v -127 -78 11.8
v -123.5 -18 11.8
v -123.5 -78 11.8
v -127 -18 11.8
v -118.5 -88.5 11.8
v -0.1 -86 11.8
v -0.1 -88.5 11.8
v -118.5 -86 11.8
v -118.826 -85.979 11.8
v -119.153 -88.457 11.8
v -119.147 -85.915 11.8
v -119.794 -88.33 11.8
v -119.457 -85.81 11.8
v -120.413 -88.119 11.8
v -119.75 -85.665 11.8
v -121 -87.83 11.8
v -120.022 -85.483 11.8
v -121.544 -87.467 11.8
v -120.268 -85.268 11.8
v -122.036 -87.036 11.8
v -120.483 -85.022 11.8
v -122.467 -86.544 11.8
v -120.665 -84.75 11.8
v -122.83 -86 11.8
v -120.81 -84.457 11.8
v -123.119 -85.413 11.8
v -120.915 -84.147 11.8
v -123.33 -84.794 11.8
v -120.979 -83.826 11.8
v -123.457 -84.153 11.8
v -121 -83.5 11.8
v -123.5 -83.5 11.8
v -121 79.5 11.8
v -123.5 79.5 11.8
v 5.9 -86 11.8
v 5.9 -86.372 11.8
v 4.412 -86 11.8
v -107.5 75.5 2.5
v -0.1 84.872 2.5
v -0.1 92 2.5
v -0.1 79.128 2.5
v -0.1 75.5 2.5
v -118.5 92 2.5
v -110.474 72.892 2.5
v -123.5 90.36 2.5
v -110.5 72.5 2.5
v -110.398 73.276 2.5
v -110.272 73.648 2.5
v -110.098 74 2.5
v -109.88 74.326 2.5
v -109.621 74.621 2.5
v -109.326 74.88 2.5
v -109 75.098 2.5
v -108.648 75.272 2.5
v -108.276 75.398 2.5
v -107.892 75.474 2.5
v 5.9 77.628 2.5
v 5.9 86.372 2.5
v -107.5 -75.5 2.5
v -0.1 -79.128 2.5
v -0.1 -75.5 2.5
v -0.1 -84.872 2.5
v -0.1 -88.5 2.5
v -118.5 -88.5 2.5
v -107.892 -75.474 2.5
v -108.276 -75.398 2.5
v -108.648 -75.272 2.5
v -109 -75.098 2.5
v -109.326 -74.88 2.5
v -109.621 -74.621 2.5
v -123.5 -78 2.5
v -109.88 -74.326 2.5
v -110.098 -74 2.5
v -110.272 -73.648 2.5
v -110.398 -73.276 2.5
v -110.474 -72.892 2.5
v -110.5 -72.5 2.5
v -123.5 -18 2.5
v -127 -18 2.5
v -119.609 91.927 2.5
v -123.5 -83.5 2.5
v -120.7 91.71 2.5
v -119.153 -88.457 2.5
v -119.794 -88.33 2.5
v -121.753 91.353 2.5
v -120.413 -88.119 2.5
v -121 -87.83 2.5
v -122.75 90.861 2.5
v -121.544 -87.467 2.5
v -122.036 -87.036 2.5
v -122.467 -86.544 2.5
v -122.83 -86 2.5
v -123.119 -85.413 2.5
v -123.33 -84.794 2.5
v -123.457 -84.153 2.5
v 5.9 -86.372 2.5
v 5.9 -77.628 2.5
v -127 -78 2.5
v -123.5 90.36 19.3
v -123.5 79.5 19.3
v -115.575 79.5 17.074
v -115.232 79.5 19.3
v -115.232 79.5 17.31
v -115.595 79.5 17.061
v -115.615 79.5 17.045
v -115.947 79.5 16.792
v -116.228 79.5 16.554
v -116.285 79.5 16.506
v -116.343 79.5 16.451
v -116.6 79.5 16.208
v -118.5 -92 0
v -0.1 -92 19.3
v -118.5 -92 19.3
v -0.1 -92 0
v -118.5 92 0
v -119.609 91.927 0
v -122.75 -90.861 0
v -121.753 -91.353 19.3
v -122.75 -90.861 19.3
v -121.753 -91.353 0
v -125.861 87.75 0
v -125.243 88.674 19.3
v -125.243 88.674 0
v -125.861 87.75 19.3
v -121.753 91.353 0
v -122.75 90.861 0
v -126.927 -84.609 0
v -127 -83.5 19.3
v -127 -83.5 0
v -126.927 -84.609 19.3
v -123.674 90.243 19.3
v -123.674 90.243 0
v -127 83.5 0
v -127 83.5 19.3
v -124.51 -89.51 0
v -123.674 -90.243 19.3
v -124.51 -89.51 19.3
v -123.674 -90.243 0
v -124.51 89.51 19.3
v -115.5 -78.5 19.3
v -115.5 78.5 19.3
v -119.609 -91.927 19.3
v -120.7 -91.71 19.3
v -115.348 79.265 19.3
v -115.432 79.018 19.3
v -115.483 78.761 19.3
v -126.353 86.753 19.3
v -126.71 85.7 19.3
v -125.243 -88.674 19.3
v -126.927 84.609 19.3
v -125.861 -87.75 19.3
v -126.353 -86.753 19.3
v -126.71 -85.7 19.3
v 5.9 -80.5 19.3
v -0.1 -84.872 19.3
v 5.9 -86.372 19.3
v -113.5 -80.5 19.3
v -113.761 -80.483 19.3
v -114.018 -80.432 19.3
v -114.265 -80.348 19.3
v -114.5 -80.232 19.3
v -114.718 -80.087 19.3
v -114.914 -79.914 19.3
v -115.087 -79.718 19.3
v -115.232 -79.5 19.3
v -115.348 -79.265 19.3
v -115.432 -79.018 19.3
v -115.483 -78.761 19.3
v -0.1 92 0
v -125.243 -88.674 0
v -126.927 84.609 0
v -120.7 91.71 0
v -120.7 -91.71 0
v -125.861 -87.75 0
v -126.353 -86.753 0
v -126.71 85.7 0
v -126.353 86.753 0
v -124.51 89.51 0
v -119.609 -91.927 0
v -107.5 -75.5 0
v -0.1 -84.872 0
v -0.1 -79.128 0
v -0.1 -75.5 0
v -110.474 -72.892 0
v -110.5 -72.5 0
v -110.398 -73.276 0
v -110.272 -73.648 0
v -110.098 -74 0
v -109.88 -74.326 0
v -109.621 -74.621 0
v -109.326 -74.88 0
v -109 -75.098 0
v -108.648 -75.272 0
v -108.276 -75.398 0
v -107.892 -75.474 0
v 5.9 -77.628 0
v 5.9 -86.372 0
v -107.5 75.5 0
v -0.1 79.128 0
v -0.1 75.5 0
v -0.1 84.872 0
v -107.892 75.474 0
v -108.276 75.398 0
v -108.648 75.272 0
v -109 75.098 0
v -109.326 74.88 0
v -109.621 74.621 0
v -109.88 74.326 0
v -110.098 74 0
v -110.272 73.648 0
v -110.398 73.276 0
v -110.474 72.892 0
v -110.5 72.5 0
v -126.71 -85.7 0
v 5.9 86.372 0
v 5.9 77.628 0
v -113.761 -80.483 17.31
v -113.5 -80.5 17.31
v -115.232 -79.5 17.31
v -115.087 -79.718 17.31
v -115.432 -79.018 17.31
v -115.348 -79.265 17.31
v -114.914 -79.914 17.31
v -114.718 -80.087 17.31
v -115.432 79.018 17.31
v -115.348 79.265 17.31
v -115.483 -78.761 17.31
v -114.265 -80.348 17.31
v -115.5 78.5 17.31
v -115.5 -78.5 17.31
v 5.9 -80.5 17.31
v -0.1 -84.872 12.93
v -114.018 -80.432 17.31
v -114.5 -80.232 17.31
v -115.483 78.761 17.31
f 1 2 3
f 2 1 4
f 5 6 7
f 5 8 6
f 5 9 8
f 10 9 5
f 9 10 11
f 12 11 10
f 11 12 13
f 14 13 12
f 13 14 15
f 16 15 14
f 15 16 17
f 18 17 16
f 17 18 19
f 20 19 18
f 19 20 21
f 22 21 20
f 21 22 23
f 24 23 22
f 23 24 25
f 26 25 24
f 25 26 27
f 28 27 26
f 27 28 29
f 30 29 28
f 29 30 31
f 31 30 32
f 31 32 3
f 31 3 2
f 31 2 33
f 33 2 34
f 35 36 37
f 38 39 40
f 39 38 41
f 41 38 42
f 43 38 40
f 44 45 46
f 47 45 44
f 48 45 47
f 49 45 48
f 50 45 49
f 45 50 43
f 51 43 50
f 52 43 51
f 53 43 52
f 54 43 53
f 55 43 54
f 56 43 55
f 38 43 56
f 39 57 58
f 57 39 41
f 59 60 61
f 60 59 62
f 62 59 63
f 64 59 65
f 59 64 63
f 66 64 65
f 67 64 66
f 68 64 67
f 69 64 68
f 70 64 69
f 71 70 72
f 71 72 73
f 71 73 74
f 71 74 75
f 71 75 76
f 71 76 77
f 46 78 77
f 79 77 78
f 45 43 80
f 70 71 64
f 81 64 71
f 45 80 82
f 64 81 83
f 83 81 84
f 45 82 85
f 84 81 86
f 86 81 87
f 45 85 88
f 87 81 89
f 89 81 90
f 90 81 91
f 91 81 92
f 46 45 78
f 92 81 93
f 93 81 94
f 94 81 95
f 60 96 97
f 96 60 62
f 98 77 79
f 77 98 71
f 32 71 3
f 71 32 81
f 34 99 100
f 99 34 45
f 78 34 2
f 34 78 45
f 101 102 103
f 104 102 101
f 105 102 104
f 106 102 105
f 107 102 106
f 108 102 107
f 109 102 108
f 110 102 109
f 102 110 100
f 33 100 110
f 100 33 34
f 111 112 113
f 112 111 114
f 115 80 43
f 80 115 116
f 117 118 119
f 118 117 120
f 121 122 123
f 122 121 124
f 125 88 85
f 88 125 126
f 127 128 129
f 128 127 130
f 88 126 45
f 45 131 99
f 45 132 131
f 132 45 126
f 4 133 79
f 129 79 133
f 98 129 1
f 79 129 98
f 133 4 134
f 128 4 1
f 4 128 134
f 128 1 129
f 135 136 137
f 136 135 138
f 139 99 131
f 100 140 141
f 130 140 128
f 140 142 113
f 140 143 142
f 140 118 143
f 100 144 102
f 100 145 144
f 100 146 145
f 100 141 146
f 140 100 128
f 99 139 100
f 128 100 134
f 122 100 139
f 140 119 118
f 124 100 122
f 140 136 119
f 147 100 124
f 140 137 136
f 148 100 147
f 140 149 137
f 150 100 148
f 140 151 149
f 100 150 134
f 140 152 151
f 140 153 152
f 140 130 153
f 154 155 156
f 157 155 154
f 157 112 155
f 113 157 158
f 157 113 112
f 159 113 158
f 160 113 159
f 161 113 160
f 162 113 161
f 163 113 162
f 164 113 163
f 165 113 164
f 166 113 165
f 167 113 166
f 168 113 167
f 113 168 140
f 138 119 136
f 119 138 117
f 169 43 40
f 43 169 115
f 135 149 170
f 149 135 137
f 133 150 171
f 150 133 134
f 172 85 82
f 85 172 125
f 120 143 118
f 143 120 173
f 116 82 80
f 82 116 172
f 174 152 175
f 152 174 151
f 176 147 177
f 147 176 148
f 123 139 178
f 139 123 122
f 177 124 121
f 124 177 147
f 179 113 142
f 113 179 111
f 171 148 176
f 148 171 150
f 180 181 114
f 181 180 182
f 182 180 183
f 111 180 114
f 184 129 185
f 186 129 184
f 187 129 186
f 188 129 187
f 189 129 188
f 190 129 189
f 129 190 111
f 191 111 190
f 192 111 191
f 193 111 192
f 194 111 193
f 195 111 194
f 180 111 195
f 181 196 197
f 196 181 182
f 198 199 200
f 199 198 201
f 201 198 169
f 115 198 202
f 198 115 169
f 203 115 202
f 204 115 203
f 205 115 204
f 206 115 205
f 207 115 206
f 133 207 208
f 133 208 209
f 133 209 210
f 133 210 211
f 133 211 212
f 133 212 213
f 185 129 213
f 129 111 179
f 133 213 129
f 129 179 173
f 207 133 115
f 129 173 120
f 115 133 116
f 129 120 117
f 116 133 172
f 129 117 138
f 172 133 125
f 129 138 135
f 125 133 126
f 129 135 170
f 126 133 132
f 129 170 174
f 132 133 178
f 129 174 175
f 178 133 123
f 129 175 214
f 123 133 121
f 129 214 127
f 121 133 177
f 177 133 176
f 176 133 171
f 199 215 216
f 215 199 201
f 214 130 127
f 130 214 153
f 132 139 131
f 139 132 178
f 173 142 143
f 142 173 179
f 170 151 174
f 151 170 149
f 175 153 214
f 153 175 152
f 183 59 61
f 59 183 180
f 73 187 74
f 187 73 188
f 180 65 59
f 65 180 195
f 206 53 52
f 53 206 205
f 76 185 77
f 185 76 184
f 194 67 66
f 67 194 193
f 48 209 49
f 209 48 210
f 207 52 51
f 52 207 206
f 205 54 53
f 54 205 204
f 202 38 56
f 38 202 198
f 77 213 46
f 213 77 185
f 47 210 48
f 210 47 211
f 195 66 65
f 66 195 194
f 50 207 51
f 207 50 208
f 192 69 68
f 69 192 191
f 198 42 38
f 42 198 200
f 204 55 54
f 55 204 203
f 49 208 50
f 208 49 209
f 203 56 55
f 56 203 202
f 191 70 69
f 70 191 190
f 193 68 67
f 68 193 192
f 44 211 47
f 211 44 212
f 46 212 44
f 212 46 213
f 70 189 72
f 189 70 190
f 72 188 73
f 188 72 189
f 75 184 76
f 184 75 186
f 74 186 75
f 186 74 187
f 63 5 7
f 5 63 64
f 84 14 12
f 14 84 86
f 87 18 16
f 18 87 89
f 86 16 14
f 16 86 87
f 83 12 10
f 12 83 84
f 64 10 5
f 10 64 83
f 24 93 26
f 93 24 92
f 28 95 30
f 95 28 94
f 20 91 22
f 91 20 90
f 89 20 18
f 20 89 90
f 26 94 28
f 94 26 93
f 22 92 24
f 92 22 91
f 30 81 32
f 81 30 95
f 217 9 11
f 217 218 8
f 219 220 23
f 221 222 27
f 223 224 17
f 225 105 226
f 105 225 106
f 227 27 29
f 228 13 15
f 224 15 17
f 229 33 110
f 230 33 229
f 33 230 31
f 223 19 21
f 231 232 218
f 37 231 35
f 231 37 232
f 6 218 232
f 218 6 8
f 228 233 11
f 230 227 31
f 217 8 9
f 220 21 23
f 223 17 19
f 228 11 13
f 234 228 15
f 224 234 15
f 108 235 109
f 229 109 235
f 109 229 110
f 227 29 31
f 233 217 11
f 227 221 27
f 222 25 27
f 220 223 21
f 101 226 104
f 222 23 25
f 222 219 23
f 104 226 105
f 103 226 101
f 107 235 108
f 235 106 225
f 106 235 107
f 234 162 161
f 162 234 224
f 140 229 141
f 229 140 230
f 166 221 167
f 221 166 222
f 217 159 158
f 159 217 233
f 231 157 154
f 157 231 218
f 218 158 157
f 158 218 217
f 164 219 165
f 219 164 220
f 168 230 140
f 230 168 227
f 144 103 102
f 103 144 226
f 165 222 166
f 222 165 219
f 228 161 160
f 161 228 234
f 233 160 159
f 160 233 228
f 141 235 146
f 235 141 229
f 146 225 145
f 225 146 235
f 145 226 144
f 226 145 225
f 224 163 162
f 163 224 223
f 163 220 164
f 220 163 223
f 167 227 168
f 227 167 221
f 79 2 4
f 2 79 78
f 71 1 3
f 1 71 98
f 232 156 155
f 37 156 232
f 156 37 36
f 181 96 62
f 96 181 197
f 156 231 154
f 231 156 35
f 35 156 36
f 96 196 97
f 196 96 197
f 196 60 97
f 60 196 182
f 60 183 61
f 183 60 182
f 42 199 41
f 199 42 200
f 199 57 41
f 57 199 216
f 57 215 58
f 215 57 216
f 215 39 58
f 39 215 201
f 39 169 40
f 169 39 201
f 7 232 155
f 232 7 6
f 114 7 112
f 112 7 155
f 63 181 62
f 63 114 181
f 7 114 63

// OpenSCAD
// file: surface-go-window-frame.scad
// Slide-in window frame for the Surface Go (1st gen) shop screen.
//
// The flat front face goes against the inside of the window glass, taped all
// the way round (12 mm VHB, e.g. 3M 5952). The tablet slides in from the open
// top edge, between the front lip and the back lip, and rests on the bottom wall.
// The Surface Connect slot is on the tablet's right edge as seen from outside
// (looking at the screen), near the bottom. Seen from the room that is the left wall.
//
// This file renders the landscape frame (open on a long edge).
// surface-go-window-frame-portrait.scad renders the portrait one (open on a
// short edge, charger at the bottom). It reuses the modules here, so change
// dimensions in this file only. The -left/-right and -portrait-top/-bottom
// files render the two halves of each frame for a 256 mm bed.
//
// Anti-rattle: the pocket has 1 mm of front-back play. Stick a strip of 1 mm
// self-adhesive felt along the back of the tablet's two side edges and bottom
// edge (within 6 mm of the edge, where the back rim overlaps it).
//
// Print front face down on the bed (clean, flat face for the tape). No supports:
// the back rim overhangs 2.5 mm flat, then slopes at 45 degrees, and there is
// no rim over the opening. Only the charger slot is bridged (60 mm).
// Strength: 4 walls (perimeters), 30% gyroid infill.
// Units mm. Coordinates as seen from the ROOM (the tablet's back) in landscape: x right,
// y up, z from the glass (0) towards the room.
//
// Licence: CC BY-NC 4.0

/* [Tablet - Surface Go 1 is 245 x 175 x 8.3] */
tab_w = 245.0;
tab_h = 175.0;
tab_t = 8.3;
clear = 1.0;           // per side around the tablet edge
play_t = 1.0;          // front-back play; a 1 mm felt strip takes it up
tab_r = 5.0;           // pocket corner radius (keep <= tablet's corner radius)

/* [Frame] */
wall = 3.5;            // side wall thickness (3.5 keeps the frame inside a 256 mm bed)
lip = 2.5;             // front lip thickness (glass side)
lip_over = 13.0;       // front lip covers the bezel this far (screen starts ~17 in)
back_flat = 2.5;       // back rim: flat overhang (prints without support)
back_over = 8.0;       // back rim: total reach over the tablet's back
back_skin = 2.0;       // back rim thickness above the 45 degree slope

/* [Cutouts - tablet edges as in landscape] */
// (room view: the charger edge is the LEFT wall, the buttons are top RIGHT)
cable_y = [-78, -18];  // Surface Connect slot in the left wall (room view), y range
btn_x = [68, 112];     // power + volume on the top edge (room view), x range

/* [Split for printing - two halves, dovetails + glue] */
dt_neck = 6.0;         // dovetail width at the seam
dt_head = 9.0;         // dovetail width at its tip
dt_len = 6.0;          // how far the dovetail reaches into the other half
dt_fit = 0.2;          // total gap between the halves (all round the dovetail)

$fn = 48;

// --- derived ---------------------------------------------------------------
pw = tab_w + 2 * clear;          // pocket 247 x 177
ph = tab_h + 2 * clear;
ow = pw + 2 * wall;              // outer 254 x 184
oh = ph + 2 * wall;
o_r = tab_r + wall;

z_pocket0 = lip;
z_back = lip + tab_t + play_t;   // tablet back / start of back lip
z_slope = z_back + (back_over - back_flat);
z_top = z_slope + back_skin;

win_w = pw - 2 * lip_over;       // 221 x 151 window (screen ~211 x 141)
win_h = ph - 2 * lip_over;

echo(str("outer ", ow, " x ", oh, " x ", z_top, "  window ", win_w, " x ", win_h,
         "  tape strip ", wall + lip_over));

assert(ow <= 255 && oh <= 255, "frame no longer fits a 256 mm bed");

// --- helpers ---------------------------------------------------------------
module rrect(w, h, r) {
    offset(r = r) square([w - 2 * r, h - 2 * r], center = true);
}

module box(x0, x1, y0, y1, z0, z1) {
    translate([x0, y0, z0]) cube([x1 - x0, y1 - y0, z1 - z0]);
}

module slab(inset, z) {
    translate([0, 0, z]) linear_extrude(0.01)
        rrect(pw - 2 * inset, ph - 2 * inset, max(tab_r - inset, 2));
}

// --- frame -----------------------------------------------------------------
// open = "top"  : landscape, tablet slides down onto its long bottom edge
// open = "right": portrait, opening on the edge opposite the charger (room
//                 view right wall); hung so the charger edge is at the bottom
module frame(open = "top") frame_body(open);

module frame_body(open) {
    big = 50;
    difference() {
        linear_extrude(z_top) rrect(ow, oh, o_r);

        // screen window, all the way through
        translate([0, 0, -1]) linear_extrude(z_top + 2) rrect(win_w, win_h, 3);
        // tablet pocket
        translate([0, 0, z_pocket0]) linear_extrude(z_back - z_pocket0) rrect(pw, ph, tab_r);
        // back opening: flat overhang, then 45 degree slope, then straight up
        hull() {
            slab(back_flat, z_back - 0.01);
            slab(back_over, z_slope);
        }
        translate([0, 0, z_slope - 0.01])
            linear_extrude(z_top) rrect(pw - 2 * back_over, ph - 2 * back_over, 2);

        // the opening: wall removed between the lips, and no back rim on that
        // edge (it would be a full-width bridge; the side rims hold the tablet)
        if (open == "top") {
            box(-pw / 2, pw / 2, 0, big + ph / 2, z_pocket0, z_back);
            box(-pw / 2, pw / 2, ph / 2 - back_over - 1, big + ph / 2, z_back - 0.01, z_top + 1);
        } else {
            box(0, big + pw / 2, -ph / 2, ph / 2, z_pocket0, z_back);
            box(pw / 2 - back_over - 1, big + pw / 2, -ph / 2, ph / 2, z_back - 0.01, z_top + 1);
        }

        // Surface Connect slot (left wall seen from the room = right edge seen from outside)
        box(-ow / 2 - 1, -pw / 2 + 1, cable_y[0], cable_y[1], z_pocket0, z_back);
        // power / volume access (top edge) when the top is closed
        if (open != "top")
            box(btn_x[0], btn_x[1], ph / 2 - 1, oh / 2 + 1, z_pocket0, z_back);
    }
}

// --- split into two halves (seam at x = 0, frame coordinates) --------------
// A 256 mm bed can't really take the 254 mm frame, so each frame also comes as
// two halves. A dovetail on the -x half sits in the middle of the front lip band
// above and below the screen window and locks into the +x half. The lip is the
// face on the bed, so the dovetails print flat; the VHB tape also spans the seam.
dt_y = (win_h / 2 + ph / 2) / 2;   // centre of the lip band
assert(dt_y + dt_head / 2 <= ph / 2 - 1.5, "dovetail too close to the pocket edge");
assert(dt_y - dt_head / 2 >= win_h / 2 + 1.5, "dovetail too close to the screen window");

module minus_x_region() {
    translate([-ow, -oh]) square([ow, 2 * oh]);
    for (s = [1, -1])
        polygon([[-1, s * dt_y - dt_neck / 2], [0, s * dt_y - dt_neck / 2],
                 [dt_len, s * dt_y - dt_head / 2], [dt_len, s * dt_y + dt_head / 2],
                 [0, s * dt_y + dt_neck / 2], [-1, s * dt_y + dt_neck / 2]]);
}

// half = -1 (the -x half, with the dovetails) or 1 (the +x half, with the sockets)
module frame_half(open, half) {
    if (half < 0)
        intersection() {
            frame(open);
            translate([0, 0, -1]) linear_extrude(z_top + 2) offset(delta = -dt_fit / 2) minus_x_region();
        }
    else
        difference() {
            frame(open);
            translate([0, 0, -1]) linear_extrude(z_top + 2) offset(delta = dt_fit / 2) minus_x_region();
        }
}

// Shown as it hangs: portrait is turned so the opening is at the top.
module frame_landscape() frame("top");
module frame_portrait() rotate([0, 0, 90]) frame("right");
module frame_landscape_left()   frame_half("top", -1);
module frame_landscape_right()  frame_half("top", 1);
module frame_portrait_bottom()  rotate([0, 0, 90]) frame_half("right", -1);
module frame_portrait_top()     rotate([0, 0, 90]) frame_half("right", 1);

frame_landscape();
// main file
// Left half of the landscape Surface Go window frame, for a 256 mm bed (Bambu A1/P1/X1).
// Print front face down, no supports. Glue to the other half at the dovetails.
// Dimensions come from surface-go-window-frame.scad.
use <surface-go-window-frame.scad>

frame_landscape_left();
